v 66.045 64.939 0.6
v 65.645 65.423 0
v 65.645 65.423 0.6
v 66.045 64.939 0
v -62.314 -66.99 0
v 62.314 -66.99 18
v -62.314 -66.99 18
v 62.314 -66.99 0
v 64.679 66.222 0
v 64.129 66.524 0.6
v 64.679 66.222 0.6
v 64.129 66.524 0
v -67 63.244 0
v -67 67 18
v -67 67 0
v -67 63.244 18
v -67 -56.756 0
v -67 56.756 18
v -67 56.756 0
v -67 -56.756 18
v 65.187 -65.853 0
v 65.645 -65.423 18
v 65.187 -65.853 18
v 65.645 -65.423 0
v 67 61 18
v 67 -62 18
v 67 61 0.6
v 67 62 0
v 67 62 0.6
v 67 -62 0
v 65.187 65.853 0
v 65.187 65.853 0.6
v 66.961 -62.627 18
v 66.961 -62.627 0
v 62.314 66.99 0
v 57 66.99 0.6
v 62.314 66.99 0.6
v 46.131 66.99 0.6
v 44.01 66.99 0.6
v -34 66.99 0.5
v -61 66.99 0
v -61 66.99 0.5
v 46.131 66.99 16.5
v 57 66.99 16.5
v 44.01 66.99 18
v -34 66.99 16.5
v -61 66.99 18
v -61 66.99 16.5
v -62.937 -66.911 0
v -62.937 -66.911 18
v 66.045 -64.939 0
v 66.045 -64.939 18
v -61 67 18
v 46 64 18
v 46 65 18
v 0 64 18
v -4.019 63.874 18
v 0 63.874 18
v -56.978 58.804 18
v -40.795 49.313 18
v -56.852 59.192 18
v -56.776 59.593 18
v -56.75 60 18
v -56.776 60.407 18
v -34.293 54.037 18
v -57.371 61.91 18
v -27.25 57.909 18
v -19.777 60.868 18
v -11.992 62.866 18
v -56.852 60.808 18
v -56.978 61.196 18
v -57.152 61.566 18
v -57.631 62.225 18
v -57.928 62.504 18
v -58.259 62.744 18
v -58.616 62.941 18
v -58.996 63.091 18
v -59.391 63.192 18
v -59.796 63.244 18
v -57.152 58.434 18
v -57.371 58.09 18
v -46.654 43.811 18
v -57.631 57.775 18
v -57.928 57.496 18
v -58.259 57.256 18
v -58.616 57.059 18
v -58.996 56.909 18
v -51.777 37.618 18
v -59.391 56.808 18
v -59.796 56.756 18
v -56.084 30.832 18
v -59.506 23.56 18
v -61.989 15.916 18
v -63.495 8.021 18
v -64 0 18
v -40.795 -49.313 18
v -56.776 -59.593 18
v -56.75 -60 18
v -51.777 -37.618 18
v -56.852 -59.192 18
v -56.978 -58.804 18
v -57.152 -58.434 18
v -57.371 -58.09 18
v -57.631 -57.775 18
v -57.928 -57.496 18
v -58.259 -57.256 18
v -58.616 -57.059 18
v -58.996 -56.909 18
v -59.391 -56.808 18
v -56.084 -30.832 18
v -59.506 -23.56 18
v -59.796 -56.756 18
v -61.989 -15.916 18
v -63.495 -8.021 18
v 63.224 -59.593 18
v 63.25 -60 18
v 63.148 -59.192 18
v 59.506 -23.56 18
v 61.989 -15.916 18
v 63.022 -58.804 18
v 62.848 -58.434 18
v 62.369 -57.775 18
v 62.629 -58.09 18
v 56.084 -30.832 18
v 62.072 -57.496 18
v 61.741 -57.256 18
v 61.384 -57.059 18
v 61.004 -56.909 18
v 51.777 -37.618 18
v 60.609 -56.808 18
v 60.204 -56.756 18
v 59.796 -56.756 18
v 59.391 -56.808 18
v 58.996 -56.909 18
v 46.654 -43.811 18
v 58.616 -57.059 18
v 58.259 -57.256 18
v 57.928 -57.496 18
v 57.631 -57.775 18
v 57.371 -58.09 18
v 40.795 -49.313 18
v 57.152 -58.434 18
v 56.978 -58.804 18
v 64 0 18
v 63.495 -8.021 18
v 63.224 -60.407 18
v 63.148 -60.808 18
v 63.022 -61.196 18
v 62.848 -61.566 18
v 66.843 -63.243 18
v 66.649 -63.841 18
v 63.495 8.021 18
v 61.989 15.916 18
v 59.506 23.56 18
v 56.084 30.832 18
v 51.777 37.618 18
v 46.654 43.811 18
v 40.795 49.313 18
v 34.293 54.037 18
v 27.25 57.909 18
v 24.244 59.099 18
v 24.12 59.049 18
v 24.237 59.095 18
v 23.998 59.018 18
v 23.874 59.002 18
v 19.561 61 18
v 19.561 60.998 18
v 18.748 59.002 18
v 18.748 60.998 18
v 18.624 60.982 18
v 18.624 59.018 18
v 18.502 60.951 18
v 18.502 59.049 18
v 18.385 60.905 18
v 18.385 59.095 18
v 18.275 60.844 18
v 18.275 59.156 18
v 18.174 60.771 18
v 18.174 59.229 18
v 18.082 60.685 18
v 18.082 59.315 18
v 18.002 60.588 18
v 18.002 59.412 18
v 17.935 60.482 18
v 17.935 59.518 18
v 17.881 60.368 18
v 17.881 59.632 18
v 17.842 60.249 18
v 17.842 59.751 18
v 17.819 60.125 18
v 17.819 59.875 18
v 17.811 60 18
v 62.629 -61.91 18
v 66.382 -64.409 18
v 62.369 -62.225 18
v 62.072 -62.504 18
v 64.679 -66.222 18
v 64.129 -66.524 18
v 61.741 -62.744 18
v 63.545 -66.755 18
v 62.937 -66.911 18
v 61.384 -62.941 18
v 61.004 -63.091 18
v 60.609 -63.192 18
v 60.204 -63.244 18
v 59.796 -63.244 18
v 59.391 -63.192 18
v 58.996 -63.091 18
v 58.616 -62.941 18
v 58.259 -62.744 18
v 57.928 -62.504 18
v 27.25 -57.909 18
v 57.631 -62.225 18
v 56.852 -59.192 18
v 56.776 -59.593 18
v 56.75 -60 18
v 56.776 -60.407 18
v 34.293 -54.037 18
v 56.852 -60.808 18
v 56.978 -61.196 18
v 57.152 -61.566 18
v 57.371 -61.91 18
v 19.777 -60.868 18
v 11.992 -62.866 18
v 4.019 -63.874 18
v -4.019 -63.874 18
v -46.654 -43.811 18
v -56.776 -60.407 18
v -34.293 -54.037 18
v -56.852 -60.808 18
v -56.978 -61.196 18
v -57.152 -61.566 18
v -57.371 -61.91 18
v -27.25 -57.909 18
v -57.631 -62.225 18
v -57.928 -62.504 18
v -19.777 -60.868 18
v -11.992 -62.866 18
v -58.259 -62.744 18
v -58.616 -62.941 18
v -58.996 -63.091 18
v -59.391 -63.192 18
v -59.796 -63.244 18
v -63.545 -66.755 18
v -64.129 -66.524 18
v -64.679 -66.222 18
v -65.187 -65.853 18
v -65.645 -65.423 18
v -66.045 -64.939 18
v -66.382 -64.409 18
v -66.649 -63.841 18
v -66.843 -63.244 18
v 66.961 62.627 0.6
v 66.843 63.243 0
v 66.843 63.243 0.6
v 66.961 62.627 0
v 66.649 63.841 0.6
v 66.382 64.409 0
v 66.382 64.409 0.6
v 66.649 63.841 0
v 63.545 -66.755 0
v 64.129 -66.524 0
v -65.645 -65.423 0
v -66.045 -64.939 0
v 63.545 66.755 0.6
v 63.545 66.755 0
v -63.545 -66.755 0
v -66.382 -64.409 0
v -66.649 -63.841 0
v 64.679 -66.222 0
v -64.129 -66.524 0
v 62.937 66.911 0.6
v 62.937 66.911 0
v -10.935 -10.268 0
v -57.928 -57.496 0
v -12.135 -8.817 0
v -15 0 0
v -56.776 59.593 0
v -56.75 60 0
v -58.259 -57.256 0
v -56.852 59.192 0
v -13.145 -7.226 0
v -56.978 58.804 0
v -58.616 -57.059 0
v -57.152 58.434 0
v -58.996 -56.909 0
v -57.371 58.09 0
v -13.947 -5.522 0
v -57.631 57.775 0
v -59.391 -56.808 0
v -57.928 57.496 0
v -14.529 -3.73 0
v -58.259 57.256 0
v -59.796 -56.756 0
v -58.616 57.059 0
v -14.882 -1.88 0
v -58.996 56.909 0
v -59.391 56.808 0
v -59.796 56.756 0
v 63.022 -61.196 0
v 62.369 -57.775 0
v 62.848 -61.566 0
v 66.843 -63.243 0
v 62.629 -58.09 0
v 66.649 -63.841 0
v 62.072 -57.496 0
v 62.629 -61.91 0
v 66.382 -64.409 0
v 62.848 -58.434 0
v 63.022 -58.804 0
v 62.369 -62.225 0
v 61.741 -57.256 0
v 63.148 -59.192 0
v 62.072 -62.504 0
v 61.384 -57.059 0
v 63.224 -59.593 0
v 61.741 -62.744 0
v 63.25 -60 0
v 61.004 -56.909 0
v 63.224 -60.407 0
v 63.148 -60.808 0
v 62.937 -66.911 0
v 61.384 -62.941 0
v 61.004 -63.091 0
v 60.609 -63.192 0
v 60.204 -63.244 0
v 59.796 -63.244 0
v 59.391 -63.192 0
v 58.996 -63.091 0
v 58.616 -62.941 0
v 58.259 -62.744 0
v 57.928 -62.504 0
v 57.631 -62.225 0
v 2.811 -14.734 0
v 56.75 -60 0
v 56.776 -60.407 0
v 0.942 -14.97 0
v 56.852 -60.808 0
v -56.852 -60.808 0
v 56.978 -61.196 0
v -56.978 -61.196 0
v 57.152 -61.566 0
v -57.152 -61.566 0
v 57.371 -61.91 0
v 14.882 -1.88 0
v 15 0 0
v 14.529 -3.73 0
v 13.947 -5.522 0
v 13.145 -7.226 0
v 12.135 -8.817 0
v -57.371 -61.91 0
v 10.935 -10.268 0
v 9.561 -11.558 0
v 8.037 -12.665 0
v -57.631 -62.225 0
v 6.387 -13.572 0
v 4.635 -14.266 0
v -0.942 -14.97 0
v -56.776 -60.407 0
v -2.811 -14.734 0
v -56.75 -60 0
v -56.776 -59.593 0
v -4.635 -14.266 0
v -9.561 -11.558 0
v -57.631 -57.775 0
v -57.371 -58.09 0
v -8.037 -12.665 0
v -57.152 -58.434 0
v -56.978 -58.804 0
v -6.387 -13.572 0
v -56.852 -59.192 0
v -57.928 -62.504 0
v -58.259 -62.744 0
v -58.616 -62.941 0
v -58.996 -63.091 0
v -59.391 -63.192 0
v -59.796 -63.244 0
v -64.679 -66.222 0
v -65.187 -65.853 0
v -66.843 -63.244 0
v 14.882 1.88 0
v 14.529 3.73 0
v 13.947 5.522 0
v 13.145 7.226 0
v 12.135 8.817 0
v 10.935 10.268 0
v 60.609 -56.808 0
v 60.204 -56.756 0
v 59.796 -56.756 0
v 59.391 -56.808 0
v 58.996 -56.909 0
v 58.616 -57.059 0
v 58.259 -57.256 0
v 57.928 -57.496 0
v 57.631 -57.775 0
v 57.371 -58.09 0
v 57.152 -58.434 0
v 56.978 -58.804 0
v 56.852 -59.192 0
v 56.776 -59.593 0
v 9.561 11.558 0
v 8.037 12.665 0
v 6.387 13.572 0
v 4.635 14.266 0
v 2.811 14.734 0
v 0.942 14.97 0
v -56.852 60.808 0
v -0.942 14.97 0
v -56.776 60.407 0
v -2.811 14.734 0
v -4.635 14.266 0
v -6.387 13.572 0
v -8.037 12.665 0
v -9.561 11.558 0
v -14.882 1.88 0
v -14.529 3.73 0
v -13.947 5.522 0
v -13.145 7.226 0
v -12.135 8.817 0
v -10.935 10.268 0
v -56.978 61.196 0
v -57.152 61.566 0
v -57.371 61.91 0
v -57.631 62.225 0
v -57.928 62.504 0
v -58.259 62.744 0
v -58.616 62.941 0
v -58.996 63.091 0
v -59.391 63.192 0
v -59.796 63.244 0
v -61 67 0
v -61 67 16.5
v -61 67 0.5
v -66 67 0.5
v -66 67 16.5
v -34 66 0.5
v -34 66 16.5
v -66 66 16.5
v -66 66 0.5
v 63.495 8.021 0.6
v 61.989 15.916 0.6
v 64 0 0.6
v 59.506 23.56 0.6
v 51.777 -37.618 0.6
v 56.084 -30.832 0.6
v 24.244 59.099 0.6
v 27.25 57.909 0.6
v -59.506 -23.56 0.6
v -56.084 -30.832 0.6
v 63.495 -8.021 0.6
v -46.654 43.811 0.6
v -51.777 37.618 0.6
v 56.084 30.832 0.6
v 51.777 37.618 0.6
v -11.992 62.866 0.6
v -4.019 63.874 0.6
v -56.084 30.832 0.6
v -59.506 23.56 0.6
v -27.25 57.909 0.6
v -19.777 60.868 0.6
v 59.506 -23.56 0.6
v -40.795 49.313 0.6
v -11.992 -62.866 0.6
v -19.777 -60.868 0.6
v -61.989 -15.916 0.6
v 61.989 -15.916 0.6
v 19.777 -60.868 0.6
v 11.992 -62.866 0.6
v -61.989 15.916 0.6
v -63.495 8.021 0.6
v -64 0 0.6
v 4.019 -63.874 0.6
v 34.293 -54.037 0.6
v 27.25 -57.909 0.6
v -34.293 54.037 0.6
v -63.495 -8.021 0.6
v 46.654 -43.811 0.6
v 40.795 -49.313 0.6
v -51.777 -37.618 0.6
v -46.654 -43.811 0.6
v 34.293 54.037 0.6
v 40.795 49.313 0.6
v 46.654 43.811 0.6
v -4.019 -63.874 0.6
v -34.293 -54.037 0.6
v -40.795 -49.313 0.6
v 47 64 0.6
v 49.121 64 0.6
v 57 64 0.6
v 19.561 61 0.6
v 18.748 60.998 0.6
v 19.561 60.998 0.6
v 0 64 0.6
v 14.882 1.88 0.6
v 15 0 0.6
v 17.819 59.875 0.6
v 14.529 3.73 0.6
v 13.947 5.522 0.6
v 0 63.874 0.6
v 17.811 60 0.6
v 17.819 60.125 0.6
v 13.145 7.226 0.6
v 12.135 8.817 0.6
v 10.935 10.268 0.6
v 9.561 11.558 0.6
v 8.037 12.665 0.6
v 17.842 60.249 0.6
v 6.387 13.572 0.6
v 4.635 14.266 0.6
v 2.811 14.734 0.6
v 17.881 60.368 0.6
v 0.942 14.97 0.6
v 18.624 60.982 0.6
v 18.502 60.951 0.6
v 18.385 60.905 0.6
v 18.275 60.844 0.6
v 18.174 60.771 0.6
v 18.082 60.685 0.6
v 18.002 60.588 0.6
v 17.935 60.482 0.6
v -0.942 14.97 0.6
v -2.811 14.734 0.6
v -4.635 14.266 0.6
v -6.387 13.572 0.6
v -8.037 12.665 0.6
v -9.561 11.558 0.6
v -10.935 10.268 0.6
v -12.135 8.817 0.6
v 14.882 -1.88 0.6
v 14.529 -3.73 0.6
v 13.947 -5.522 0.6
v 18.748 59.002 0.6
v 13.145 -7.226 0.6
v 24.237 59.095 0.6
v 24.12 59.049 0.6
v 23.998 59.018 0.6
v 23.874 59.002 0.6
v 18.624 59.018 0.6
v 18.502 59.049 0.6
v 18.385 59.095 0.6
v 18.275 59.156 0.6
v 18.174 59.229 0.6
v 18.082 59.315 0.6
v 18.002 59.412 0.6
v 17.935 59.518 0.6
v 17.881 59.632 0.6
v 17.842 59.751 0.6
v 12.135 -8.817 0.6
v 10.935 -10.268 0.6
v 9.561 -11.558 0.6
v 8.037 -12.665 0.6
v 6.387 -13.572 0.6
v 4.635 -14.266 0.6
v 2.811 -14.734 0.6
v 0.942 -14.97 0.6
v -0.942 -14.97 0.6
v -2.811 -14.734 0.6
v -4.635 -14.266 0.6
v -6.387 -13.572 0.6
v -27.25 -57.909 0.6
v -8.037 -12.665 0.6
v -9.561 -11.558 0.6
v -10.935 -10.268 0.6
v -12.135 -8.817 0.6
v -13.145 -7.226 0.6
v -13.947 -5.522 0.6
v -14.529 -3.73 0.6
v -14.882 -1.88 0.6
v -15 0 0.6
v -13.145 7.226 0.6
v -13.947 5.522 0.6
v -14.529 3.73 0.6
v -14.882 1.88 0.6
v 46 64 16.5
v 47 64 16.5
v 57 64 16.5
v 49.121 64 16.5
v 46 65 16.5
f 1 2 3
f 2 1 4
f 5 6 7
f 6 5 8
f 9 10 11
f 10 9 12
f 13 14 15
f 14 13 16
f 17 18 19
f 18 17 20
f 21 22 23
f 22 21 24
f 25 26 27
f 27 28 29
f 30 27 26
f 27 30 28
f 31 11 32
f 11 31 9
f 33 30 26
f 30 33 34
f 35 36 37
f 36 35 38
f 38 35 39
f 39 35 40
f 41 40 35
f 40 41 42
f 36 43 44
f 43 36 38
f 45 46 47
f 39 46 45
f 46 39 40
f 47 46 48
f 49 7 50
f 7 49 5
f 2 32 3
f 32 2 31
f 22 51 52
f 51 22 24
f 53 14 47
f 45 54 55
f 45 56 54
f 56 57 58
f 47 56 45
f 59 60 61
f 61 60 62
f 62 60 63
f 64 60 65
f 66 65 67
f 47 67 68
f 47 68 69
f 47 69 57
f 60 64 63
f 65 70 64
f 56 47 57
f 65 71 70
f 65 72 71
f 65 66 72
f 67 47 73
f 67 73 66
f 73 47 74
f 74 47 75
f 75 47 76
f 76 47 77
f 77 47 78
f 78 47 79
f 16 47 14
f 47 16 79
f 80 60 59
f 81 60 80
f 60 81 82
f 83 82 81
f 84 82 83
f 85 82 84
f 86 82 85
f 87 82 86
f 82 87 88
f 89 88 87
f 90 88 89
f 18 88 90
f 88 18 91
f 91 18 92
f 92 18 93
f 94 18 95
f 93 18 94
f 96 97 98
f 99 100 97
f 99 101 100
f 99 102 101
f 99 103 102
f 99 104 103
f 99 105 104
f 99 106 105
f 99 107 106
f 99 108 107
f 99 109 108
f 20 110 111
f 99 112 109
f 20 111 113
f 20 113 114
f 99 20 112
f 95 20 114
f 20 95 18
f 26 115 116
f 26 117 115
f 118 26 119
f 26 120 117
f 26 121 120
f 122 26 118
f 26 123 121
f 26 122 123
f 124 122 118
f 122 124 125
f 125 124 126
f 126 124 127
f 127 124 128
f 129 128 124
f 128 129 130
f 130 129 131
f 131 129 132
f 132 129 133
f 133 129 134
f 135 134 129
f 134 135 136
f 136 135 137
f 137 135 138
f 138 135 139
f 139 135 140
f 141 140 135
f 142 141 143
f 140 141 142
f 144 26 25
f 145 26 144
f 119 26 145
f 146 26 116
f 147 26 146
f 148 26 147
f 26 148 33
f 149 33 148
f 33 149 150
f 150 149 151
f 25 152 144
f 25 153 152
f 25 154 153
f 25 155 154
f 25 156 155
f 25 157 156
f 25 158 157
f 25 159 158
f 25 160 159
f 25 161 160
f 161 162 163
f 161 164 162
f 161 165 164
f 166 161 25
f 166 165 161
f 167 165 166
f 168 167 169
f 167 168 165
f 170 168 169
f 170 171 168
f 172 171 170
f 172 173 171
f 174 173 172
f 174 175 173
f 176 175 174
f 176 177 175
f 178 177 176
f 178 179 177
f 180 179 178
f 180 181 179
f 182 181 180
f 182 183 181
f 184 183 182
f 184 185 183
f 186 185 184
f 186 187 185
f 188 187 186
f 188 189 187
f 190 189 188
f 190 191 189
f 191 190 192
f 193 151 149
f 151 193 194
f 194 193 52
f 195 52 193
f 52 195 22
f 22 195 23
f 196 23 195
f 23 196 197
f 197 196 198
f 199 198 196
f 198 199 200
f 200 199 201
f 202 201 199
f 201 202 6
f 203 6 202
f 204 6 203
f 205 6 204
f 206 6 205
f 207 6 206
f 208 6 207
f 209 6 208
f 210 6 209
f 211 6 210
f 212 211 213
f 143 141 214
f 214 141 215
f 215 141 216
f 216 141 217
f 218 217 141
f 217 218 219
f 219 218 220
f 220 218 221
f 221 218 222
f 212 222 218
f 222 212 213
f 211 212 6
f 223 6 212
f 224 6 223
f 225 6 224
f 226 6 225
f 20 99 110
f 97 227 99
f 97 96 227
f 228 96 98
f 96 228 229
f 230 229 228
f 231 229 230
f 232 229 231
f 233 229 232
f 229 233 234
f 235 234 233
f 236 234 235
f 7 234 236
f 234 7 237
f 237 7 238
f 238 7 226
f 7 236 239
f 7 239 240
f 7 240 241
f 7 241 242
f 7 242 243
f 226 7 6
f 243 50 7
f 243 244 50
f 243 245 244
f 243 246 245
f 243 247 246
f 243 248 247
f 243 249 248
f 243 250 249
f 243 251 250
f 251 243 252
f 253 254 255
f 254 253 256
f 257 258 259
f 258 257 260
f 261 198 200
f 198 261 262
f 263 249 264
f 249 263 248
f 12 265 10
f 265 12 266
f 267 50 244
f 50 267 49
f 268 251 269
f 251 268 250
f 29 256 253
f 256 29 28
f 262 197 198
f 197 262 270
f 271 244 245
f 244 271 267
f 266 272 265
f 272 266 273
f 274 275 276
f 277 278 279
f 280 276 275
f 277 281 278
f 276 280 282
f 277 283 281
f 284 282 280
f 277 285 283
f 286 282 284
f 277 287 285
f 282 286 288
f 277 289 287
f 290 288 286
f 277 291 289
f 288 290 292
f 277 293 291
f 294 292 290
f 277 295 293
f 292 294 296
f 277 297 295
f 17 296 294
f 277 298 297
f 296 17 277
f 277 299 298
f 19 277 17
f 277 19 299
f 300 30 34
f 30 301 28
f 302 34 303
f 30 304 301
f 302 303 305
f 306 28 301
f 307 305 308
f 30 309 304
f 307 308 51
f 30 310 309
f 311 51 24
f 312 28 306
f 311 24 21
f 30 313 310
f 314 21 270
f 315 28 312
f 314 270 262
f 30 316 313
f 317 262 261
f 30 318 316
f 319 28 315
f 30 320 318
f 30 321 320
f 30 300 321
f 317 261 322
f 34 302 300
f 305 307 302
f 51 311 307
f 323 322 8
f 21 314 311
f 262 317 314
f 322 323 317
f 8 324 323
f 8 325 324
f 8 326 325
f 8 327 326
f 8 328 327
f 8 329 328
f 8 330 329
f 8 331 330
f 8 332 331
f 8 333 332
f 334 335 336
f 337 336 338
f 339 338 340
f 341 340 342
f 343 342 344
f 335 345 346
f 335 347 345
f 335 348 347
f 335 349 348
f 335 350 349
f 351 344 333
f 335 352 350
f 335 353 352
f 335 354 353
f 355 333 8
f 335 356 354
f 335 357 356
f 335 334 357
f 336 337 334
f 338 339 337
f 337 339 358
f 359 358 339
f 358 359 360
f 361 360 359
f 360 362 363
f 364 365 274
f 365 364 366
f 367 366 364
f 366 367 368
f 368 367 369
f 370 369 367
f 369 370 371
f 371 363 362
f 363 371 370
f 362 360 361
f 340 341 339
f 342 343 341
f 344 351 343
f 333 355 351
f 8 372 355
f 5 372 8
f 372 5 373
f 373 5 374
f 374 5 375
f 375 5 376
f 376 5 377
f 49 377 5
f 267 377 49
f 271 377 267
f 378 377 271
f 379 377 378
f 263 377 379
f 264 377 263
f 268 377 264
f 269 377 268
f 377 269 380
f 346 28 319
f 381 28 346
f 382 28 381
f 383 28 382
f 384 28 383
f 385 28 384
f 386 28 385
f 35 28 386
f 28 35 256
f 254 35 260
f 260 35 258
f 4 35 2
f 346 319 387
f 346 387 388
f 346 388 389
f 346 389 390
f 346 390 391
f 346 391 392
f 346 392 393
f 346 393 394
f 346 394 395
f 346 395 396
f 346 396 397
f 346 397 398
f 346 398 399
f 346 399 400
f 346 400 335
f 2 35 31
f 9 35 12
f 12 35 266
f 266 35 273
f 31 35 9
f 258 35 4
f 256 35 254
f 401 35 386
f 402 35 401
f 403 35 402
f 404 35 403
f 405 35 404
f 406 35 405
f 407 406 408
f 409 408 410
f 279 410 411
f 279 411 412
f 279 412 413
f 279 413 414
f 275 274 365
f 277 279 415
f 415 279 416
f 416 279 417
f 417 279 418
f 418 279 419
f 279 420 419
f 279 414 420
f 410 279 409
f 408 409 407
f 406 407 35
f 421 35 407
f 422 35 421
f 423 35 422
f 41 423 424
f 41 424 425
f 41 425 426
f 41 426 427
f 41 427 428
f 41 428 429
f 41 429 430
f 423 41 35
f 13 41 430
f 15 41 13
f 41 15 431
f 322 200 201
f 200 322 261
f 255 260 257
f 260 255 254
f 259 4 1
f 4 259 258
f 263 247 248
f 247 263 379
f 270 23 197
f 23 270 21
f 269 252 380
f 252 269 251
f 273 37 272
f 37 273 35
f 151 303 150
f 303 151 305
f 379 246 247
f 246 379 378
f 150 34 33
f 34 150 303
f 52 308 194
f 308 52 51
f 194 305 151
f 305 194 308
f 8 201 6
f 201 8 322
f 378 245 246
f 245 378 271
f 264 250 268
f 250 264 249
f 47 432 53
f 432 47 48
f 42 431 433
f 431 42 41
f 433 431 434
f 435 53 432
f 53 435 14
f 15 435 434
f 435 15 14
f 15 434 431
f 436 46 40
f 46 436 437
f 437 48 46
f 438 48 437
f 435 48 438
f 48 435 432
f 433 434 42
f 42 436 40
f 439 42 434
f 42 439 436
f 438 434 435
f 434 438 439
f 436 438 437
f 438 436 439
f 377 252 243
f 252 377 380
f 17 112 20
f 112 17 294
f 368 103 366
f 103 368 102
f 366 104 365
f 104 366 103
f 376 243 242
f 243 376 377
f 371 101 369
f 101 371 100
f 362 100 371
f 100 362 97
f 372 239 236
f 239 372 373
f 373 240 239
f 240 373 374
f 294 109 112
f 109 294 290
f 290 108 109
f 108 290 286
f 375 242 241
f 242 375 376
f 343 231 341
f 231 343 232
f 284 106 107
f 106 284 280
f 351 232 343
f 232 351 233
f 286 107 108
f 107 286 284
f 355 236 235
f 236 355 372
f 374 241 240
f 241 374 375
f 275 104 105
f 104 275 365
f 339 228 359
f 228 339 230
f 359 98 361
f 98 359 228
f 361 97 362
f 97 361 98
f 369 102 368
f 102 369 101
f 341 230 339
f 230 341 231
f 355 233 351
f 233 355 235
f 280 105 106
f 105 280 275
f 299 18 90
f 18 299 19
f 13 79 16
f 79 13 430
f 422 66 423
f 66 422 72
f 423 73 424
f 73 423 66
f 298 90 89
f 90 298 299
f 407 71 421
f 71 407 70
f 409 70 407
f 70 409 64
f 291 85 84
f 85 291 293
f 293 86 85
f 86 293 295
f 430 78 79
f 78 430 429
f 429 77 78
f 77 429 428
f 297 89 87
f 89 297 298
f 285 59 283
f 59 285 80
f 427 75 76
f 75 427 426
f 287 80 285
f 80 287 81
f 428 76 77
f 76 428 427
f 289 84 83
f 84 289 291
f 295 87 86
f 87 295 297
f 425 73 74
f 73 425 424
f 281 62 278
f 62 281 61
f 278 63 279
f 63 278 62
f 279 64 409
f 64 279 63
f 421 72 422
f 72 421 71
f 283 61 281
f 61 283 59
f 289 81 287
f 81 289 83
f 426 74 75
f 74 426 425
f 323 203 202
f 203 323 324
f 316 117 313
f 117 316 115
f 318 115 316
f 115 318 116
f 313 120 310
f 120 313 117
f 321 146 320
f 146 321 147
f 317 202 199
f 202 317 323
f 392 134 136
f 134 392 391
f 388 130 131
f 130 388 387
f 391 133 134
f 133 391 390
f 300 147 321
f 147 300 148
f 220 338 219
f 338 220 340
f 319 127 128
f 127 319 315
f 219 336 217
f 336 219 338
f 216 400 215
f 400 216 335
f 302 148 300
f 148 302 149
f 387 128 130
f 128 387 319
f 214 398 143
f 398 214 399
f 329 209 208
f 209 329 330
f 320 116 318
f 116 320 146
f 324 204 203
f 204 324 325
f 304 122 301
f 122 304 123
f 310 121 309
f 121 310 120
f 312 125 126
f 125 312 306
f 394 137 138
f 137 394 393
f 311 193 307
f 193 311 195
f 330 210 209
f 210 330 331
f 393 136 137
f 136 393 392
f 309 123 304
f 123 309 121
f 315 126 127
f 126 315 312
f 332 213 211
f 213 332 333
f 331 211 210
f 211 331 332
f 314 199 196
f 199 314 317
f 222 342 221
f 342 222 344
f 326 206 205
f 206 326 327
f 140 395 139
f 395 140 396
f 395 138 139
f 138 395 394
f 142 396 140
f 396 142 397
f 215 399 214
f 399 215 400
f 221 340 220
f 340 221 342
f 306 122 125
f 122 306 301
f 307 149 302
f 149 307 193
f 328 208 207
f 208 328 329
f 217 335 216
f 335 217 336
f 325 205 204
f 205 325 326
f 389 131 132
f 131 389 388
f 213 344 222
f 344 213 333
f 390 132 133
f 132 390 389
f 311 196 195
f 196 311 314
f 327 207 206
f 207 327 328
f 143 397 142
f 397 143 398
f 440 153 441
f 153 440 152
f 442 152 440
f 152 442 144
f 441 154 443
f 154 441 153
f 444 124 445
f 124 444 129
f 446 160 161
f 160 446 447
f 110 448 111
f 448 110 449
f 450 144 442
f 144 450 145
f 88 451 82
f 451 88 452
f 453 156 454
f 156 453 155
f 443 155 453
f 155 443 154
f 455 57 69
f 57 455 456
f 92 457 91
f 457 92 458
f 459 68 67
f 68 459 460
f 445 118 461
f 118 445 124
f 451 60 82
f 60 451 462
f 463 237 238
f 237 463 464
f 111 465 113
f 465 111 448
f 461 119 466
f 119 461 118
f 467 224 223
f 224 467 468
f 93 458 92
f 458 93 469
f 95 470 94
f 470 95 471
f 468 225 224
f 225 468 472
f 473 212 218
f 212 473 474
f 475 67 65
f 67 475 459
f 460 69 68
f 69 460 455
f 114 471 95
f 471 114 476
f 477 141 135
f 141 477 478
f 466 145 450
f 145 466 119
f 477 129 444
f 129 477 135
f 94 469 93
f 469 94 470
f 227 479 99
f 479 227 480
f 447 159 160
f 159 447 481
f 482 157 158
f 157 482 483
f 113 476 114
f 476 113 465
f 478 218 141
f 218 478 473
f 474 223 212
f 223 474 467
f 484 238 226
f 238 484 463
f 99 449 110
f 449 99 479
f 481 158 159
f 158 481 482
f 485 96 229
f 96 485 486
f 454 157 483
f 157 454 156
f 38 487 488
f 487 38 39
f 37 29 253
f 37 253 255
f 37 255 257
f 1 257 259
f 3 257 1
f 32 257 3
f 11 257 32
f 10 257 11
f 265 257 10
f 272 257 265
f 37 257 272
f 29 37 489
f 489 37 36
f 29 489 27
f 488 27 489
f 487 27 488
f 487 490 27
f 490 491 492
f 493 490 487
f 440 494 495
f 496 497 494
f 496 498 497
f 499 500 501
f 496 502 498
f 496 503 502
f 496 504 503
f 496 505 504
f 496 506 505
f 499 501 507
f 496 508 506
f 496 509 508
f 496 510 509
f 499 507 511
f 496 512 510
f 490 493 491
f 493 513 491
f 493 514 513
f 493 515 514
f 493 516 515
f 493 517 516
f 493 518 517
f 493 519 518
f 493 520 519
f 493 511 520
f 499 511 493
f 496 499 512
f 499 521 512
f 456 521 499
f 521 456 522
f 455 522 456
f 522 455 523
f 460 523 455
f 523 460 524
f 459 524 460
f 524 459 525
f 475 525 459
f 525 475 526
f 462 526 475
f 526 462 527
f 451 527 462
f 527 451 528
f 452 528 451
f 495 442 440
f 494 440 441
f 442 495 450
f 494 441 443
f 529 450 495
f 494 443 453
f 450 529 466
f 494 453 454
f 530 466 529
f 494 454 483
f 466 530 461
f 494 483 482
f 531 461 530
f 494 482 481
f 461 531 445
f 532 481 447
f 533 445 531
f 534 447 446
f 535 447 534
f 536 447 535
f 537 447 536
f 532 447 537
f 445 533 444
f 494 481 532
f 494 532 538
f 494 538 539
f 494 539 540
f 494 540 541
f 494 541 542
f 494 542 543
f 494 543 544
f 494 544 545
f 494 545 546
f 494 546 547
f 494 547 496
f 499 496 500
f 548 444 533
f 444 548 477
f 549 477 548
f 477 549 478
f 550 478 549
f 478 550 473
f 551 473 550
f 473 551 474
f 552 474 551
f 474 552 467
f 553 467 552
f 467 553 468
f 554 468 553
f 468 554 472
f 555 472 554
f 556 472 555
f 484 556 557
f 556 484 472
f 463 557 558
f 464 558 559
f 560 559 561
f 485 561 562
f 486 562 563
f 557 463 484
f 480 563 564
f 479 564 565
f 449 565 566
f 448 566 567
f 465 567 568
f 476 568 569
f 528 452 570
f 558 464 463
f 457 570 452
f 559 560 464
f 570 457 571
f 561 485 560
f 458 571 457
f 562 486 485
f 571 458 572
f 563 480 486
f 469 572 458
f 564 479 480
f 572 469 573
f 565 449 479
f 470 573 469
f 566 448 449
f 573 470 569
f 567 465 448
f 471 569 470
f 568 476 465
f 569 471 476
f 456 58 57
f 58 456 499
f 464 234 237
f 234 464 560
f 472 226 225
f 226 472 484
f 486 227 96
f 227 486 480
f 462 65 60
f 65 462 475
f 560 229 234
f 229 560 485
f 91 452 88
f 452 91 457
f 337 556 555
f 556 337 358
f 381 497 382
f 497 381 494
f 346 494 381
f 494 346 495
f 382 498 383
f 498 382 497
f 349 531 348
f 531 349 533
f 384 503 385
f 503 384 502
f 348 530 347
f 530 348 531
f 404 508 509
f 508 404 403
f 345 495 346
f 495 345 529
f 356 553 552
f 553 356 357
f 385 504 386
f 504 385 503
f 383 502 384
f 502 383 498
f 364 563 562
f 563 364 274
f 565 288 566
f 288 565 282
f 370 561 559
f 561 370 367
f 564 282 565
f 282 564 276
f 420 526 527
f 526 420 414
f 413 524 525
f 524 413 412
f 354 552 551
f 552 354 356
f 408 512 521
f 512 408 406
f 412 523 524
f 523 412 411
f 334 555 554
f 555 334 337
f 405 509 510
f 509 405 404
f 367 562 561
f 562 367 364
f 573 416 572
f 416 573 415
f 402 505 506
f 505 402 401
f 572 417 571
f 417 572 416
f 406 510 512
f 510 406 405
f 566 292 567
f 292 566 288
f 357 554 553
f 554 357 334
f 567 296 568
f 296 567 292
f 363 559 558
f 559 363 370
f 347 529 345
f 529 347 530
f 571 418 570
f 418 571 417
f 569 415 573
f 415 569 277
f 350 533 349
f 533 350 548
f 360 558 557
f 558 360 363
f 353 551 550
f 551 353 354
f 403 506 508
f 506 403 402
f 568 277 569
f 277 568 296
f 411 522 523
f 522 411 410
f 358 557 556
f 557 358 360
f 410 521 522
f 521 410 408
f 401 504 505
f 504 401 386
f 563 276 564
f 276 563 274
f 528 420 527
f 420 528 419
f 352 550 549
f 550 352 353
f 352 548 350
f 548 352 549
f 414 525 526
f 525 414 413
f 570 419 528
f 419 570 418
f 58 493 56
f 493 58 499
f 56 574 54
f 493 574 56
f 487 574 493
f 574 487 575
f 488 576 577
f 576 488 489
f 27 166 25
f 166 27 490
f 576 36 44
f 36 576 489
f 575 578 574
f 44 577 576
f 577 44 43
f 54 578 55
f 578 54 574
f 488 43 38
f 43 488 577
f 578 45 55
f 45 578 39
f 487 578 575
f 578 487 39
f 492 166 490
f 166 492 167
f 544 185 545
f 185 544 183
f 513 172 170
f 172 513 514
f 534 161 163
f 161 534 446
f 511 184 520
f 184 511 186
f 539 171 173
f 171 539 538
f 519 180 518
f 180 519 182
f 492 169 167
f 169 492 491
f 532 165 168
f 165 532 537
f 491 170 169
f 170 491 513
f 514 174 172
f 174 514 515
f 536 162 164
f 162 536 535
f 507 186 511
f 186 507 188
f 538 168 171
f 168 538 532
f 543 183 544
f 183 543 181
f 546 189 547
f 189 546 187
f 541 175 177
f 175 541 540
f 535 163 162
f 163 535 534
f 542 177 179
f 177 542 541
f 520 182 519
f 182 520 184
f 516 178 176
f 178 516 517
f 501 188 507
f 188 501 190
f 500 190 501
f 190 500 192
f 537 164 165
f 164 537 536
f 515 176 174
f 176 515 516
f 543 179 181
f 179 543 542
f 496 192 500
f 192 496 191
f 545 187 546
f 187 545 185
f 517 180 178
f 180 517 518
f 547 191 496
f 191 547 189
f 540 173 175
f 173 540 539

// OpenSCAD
$fn = 50;


union() {
	difference() {
		union() {
			translate(v = [0, 0, 0]) {
				rotate(a = [0, 0, 0]) {
					hull() {
						translate(v = [-62.0000000000, 62.0000000000, 0]) {
							rotate(a = [0, 0, 0]) {
								translate(v = [0, 0, 0]) {
									rotate(a = [0, 0, 0]) {
										cylinder(h = 18, r = 5);
									}
								}
							}
						}
						translate(v = [62.0000000000, 62.0000000000, 0]) {
							rotate(a = [0, 0, 0]) {
								translate(v = [0, 0, 0]) {
									rotate(a = [0, 0, 0]) {
										cylinder(h = 18, r = 5);
									}
								}
							}
						}
						translate(v = [-62.0000000000, -62.0000000000, 0]) {
							rotate(a = [0, 0, 0]) {
								translate(v = [0, 0, 0]) {
									rotate(a = [0, 0, 0]) {
										cylinder(h = 18, r = 5);
									}
								}
							}
						}
						translate(v = [62.0000000000, -62.0000000000, 0]) {
							rotate(a = [0, 0, 0]) {
								translate(v = [0, 0, 0]) {
									rotate(a = [0, 0, 0]) {
										cylinder(h = 18, r = 5);
									}
								}
							}
						}
					}
				}
			}
			translate(v = [-67.0000000000, 61.0000000000, 0]) {
				rotate(a = [0, 0, 0]) {
					cube(size = [6, 6, 18]);
				}
			}
		}
		union() {
			#translate(v = [-66.0000000000, 66.0000000000, 0.5000000000]) {
				rotate(a = [0, 0, 0]) {
					cube(size = [32, 1, 16]);
				}
			}
			translate(v = [-67.5000000000, -60.0000000000, -125]) {
				rotate(a = [0, 0, 0]) {
					hull() {
						translate(v = [7.5000000000, 0, 0]) {
							rotate(a = [0, 0, 0]) {
								translate(v = [0, 0, 0]) {
									rotate(a = [0, 0, 0]) {
										cylinder(h = 250, r = 3.2500000000);
									}
								}
							}
						}
						translate(v = [-7.5000000000, 0, 0]) {
							rotate(a = [0, 0, 0]) {
								translate(v = [0, 0, 0]) {
									rotate(a = [0, 0, 0]) {
										cylinder(h = 250, r = 3.2500000000);
									}
								}
							}
						}
					}
				}
			}
			translate(v = [-67.5000000000, 60.0000000000, -125]) {
				rotate(a = [0, 0, 0]) {
					hull() {
						translate(v = [7.5000000000, 0, 0]) {
							rotate(a = [0, 0, 0]) {
								translate(v = [0, 0, 0]) {
									rotate(a = [0, 0, 0]) {
										cylinder(h = 250, r = 3.2500000000);
									}
								}
							}
						}
						translate(v = [-7.5000000000, 0, 0]) {
							rotate(a = [0, 0, 0]) {
								translate(v = [0, 0, 0]) {
									rotate(a = [0, 0, 0]) {
										cylinder(h = 250, r = 3.2500000000);
									}
								}
							}
						}
					}
				}
			}
			translate(v = [60.0000000000, -60.0000000000, -125.0000000000]) {
				rotate(a = [0, 0, 0]) {
					cylinder(h = 250, r = 3.2500000000);
				}
			}
			translate(v = [0, 0, 0.6000000000]) {
				rotate(a = [0, 0, 0]) {
					cylinder(h = 20.4000000000, r = 64.0000000000);
				}
			}
			translate(v = [0, 0, -9.0000000000]) {
				rotate(a = [0, 0, 0]) {
					cylinder(h = 18, r = 15.0000000000);
				}
			}
			translate(v = [0.0000000000, 61.0000000000, 0.6000000000]) {
				rotate(a = [0, 0, 0]) {
					cube(size = [67.0000000000, 3, 20.4000000000]);
				}
			}
			translate(v = [57.0000000000, 61.0000000000, 0.6000000000]) {
				rotate(a = [0, 0, 0]) {
					cube(size = [10, 6, 20.4000000000]);
				}
			}
			translate(v = [46.0000000000, 61.0000000000, 16.5000000000]) {
				rotate(a = [0, 0, 0]) {
					cube(size = [21, 6, 1.5000000000]);
				}
			}
			translate(v = [43.2500000000, 67.7500000000, 0.6000000000]) {
				rotate(a = [0, 0, -45]) {
					cube(size = [7.5000000000, 1.5000000000, 20.4000000000]);
				}
			}
			translate(v = [12.0610000000, 59.0000000000, 0.6000000000]) {
				rotate(a = [0, 0, 0]) {
					cube(size = [7.5000000000, 2, 17.4000000000]);
				}
			}
		}
	}
	union() {
		translate(v = [21.3110000000, 60.0000000000, 0]) {
			rotate(a = [0, 0, 0]) {
				hull() {
					translate(v = [2.5000000000, 0, 0]) {
						rotate(a = [0, 0, 0]) {
							#translate(v = [0, 0, 0]) {
								rotate(a = [0, 0, 0]) {
									cylinder(h = 18, r = 1.0000000000);
								}
							}
						}
					}
					translate(v = [-2.5000000000, 0, 0]) {
						rotate(a = [0, 0, 0]) {
							#translate(v = [0, 0, 0]) {
								rotate(a = [0, 0, 0]) {
									cylinder(h = 18, r = 1.0000000000);
								}
							}
						}
					}
				}
			}
		}
	}
}
